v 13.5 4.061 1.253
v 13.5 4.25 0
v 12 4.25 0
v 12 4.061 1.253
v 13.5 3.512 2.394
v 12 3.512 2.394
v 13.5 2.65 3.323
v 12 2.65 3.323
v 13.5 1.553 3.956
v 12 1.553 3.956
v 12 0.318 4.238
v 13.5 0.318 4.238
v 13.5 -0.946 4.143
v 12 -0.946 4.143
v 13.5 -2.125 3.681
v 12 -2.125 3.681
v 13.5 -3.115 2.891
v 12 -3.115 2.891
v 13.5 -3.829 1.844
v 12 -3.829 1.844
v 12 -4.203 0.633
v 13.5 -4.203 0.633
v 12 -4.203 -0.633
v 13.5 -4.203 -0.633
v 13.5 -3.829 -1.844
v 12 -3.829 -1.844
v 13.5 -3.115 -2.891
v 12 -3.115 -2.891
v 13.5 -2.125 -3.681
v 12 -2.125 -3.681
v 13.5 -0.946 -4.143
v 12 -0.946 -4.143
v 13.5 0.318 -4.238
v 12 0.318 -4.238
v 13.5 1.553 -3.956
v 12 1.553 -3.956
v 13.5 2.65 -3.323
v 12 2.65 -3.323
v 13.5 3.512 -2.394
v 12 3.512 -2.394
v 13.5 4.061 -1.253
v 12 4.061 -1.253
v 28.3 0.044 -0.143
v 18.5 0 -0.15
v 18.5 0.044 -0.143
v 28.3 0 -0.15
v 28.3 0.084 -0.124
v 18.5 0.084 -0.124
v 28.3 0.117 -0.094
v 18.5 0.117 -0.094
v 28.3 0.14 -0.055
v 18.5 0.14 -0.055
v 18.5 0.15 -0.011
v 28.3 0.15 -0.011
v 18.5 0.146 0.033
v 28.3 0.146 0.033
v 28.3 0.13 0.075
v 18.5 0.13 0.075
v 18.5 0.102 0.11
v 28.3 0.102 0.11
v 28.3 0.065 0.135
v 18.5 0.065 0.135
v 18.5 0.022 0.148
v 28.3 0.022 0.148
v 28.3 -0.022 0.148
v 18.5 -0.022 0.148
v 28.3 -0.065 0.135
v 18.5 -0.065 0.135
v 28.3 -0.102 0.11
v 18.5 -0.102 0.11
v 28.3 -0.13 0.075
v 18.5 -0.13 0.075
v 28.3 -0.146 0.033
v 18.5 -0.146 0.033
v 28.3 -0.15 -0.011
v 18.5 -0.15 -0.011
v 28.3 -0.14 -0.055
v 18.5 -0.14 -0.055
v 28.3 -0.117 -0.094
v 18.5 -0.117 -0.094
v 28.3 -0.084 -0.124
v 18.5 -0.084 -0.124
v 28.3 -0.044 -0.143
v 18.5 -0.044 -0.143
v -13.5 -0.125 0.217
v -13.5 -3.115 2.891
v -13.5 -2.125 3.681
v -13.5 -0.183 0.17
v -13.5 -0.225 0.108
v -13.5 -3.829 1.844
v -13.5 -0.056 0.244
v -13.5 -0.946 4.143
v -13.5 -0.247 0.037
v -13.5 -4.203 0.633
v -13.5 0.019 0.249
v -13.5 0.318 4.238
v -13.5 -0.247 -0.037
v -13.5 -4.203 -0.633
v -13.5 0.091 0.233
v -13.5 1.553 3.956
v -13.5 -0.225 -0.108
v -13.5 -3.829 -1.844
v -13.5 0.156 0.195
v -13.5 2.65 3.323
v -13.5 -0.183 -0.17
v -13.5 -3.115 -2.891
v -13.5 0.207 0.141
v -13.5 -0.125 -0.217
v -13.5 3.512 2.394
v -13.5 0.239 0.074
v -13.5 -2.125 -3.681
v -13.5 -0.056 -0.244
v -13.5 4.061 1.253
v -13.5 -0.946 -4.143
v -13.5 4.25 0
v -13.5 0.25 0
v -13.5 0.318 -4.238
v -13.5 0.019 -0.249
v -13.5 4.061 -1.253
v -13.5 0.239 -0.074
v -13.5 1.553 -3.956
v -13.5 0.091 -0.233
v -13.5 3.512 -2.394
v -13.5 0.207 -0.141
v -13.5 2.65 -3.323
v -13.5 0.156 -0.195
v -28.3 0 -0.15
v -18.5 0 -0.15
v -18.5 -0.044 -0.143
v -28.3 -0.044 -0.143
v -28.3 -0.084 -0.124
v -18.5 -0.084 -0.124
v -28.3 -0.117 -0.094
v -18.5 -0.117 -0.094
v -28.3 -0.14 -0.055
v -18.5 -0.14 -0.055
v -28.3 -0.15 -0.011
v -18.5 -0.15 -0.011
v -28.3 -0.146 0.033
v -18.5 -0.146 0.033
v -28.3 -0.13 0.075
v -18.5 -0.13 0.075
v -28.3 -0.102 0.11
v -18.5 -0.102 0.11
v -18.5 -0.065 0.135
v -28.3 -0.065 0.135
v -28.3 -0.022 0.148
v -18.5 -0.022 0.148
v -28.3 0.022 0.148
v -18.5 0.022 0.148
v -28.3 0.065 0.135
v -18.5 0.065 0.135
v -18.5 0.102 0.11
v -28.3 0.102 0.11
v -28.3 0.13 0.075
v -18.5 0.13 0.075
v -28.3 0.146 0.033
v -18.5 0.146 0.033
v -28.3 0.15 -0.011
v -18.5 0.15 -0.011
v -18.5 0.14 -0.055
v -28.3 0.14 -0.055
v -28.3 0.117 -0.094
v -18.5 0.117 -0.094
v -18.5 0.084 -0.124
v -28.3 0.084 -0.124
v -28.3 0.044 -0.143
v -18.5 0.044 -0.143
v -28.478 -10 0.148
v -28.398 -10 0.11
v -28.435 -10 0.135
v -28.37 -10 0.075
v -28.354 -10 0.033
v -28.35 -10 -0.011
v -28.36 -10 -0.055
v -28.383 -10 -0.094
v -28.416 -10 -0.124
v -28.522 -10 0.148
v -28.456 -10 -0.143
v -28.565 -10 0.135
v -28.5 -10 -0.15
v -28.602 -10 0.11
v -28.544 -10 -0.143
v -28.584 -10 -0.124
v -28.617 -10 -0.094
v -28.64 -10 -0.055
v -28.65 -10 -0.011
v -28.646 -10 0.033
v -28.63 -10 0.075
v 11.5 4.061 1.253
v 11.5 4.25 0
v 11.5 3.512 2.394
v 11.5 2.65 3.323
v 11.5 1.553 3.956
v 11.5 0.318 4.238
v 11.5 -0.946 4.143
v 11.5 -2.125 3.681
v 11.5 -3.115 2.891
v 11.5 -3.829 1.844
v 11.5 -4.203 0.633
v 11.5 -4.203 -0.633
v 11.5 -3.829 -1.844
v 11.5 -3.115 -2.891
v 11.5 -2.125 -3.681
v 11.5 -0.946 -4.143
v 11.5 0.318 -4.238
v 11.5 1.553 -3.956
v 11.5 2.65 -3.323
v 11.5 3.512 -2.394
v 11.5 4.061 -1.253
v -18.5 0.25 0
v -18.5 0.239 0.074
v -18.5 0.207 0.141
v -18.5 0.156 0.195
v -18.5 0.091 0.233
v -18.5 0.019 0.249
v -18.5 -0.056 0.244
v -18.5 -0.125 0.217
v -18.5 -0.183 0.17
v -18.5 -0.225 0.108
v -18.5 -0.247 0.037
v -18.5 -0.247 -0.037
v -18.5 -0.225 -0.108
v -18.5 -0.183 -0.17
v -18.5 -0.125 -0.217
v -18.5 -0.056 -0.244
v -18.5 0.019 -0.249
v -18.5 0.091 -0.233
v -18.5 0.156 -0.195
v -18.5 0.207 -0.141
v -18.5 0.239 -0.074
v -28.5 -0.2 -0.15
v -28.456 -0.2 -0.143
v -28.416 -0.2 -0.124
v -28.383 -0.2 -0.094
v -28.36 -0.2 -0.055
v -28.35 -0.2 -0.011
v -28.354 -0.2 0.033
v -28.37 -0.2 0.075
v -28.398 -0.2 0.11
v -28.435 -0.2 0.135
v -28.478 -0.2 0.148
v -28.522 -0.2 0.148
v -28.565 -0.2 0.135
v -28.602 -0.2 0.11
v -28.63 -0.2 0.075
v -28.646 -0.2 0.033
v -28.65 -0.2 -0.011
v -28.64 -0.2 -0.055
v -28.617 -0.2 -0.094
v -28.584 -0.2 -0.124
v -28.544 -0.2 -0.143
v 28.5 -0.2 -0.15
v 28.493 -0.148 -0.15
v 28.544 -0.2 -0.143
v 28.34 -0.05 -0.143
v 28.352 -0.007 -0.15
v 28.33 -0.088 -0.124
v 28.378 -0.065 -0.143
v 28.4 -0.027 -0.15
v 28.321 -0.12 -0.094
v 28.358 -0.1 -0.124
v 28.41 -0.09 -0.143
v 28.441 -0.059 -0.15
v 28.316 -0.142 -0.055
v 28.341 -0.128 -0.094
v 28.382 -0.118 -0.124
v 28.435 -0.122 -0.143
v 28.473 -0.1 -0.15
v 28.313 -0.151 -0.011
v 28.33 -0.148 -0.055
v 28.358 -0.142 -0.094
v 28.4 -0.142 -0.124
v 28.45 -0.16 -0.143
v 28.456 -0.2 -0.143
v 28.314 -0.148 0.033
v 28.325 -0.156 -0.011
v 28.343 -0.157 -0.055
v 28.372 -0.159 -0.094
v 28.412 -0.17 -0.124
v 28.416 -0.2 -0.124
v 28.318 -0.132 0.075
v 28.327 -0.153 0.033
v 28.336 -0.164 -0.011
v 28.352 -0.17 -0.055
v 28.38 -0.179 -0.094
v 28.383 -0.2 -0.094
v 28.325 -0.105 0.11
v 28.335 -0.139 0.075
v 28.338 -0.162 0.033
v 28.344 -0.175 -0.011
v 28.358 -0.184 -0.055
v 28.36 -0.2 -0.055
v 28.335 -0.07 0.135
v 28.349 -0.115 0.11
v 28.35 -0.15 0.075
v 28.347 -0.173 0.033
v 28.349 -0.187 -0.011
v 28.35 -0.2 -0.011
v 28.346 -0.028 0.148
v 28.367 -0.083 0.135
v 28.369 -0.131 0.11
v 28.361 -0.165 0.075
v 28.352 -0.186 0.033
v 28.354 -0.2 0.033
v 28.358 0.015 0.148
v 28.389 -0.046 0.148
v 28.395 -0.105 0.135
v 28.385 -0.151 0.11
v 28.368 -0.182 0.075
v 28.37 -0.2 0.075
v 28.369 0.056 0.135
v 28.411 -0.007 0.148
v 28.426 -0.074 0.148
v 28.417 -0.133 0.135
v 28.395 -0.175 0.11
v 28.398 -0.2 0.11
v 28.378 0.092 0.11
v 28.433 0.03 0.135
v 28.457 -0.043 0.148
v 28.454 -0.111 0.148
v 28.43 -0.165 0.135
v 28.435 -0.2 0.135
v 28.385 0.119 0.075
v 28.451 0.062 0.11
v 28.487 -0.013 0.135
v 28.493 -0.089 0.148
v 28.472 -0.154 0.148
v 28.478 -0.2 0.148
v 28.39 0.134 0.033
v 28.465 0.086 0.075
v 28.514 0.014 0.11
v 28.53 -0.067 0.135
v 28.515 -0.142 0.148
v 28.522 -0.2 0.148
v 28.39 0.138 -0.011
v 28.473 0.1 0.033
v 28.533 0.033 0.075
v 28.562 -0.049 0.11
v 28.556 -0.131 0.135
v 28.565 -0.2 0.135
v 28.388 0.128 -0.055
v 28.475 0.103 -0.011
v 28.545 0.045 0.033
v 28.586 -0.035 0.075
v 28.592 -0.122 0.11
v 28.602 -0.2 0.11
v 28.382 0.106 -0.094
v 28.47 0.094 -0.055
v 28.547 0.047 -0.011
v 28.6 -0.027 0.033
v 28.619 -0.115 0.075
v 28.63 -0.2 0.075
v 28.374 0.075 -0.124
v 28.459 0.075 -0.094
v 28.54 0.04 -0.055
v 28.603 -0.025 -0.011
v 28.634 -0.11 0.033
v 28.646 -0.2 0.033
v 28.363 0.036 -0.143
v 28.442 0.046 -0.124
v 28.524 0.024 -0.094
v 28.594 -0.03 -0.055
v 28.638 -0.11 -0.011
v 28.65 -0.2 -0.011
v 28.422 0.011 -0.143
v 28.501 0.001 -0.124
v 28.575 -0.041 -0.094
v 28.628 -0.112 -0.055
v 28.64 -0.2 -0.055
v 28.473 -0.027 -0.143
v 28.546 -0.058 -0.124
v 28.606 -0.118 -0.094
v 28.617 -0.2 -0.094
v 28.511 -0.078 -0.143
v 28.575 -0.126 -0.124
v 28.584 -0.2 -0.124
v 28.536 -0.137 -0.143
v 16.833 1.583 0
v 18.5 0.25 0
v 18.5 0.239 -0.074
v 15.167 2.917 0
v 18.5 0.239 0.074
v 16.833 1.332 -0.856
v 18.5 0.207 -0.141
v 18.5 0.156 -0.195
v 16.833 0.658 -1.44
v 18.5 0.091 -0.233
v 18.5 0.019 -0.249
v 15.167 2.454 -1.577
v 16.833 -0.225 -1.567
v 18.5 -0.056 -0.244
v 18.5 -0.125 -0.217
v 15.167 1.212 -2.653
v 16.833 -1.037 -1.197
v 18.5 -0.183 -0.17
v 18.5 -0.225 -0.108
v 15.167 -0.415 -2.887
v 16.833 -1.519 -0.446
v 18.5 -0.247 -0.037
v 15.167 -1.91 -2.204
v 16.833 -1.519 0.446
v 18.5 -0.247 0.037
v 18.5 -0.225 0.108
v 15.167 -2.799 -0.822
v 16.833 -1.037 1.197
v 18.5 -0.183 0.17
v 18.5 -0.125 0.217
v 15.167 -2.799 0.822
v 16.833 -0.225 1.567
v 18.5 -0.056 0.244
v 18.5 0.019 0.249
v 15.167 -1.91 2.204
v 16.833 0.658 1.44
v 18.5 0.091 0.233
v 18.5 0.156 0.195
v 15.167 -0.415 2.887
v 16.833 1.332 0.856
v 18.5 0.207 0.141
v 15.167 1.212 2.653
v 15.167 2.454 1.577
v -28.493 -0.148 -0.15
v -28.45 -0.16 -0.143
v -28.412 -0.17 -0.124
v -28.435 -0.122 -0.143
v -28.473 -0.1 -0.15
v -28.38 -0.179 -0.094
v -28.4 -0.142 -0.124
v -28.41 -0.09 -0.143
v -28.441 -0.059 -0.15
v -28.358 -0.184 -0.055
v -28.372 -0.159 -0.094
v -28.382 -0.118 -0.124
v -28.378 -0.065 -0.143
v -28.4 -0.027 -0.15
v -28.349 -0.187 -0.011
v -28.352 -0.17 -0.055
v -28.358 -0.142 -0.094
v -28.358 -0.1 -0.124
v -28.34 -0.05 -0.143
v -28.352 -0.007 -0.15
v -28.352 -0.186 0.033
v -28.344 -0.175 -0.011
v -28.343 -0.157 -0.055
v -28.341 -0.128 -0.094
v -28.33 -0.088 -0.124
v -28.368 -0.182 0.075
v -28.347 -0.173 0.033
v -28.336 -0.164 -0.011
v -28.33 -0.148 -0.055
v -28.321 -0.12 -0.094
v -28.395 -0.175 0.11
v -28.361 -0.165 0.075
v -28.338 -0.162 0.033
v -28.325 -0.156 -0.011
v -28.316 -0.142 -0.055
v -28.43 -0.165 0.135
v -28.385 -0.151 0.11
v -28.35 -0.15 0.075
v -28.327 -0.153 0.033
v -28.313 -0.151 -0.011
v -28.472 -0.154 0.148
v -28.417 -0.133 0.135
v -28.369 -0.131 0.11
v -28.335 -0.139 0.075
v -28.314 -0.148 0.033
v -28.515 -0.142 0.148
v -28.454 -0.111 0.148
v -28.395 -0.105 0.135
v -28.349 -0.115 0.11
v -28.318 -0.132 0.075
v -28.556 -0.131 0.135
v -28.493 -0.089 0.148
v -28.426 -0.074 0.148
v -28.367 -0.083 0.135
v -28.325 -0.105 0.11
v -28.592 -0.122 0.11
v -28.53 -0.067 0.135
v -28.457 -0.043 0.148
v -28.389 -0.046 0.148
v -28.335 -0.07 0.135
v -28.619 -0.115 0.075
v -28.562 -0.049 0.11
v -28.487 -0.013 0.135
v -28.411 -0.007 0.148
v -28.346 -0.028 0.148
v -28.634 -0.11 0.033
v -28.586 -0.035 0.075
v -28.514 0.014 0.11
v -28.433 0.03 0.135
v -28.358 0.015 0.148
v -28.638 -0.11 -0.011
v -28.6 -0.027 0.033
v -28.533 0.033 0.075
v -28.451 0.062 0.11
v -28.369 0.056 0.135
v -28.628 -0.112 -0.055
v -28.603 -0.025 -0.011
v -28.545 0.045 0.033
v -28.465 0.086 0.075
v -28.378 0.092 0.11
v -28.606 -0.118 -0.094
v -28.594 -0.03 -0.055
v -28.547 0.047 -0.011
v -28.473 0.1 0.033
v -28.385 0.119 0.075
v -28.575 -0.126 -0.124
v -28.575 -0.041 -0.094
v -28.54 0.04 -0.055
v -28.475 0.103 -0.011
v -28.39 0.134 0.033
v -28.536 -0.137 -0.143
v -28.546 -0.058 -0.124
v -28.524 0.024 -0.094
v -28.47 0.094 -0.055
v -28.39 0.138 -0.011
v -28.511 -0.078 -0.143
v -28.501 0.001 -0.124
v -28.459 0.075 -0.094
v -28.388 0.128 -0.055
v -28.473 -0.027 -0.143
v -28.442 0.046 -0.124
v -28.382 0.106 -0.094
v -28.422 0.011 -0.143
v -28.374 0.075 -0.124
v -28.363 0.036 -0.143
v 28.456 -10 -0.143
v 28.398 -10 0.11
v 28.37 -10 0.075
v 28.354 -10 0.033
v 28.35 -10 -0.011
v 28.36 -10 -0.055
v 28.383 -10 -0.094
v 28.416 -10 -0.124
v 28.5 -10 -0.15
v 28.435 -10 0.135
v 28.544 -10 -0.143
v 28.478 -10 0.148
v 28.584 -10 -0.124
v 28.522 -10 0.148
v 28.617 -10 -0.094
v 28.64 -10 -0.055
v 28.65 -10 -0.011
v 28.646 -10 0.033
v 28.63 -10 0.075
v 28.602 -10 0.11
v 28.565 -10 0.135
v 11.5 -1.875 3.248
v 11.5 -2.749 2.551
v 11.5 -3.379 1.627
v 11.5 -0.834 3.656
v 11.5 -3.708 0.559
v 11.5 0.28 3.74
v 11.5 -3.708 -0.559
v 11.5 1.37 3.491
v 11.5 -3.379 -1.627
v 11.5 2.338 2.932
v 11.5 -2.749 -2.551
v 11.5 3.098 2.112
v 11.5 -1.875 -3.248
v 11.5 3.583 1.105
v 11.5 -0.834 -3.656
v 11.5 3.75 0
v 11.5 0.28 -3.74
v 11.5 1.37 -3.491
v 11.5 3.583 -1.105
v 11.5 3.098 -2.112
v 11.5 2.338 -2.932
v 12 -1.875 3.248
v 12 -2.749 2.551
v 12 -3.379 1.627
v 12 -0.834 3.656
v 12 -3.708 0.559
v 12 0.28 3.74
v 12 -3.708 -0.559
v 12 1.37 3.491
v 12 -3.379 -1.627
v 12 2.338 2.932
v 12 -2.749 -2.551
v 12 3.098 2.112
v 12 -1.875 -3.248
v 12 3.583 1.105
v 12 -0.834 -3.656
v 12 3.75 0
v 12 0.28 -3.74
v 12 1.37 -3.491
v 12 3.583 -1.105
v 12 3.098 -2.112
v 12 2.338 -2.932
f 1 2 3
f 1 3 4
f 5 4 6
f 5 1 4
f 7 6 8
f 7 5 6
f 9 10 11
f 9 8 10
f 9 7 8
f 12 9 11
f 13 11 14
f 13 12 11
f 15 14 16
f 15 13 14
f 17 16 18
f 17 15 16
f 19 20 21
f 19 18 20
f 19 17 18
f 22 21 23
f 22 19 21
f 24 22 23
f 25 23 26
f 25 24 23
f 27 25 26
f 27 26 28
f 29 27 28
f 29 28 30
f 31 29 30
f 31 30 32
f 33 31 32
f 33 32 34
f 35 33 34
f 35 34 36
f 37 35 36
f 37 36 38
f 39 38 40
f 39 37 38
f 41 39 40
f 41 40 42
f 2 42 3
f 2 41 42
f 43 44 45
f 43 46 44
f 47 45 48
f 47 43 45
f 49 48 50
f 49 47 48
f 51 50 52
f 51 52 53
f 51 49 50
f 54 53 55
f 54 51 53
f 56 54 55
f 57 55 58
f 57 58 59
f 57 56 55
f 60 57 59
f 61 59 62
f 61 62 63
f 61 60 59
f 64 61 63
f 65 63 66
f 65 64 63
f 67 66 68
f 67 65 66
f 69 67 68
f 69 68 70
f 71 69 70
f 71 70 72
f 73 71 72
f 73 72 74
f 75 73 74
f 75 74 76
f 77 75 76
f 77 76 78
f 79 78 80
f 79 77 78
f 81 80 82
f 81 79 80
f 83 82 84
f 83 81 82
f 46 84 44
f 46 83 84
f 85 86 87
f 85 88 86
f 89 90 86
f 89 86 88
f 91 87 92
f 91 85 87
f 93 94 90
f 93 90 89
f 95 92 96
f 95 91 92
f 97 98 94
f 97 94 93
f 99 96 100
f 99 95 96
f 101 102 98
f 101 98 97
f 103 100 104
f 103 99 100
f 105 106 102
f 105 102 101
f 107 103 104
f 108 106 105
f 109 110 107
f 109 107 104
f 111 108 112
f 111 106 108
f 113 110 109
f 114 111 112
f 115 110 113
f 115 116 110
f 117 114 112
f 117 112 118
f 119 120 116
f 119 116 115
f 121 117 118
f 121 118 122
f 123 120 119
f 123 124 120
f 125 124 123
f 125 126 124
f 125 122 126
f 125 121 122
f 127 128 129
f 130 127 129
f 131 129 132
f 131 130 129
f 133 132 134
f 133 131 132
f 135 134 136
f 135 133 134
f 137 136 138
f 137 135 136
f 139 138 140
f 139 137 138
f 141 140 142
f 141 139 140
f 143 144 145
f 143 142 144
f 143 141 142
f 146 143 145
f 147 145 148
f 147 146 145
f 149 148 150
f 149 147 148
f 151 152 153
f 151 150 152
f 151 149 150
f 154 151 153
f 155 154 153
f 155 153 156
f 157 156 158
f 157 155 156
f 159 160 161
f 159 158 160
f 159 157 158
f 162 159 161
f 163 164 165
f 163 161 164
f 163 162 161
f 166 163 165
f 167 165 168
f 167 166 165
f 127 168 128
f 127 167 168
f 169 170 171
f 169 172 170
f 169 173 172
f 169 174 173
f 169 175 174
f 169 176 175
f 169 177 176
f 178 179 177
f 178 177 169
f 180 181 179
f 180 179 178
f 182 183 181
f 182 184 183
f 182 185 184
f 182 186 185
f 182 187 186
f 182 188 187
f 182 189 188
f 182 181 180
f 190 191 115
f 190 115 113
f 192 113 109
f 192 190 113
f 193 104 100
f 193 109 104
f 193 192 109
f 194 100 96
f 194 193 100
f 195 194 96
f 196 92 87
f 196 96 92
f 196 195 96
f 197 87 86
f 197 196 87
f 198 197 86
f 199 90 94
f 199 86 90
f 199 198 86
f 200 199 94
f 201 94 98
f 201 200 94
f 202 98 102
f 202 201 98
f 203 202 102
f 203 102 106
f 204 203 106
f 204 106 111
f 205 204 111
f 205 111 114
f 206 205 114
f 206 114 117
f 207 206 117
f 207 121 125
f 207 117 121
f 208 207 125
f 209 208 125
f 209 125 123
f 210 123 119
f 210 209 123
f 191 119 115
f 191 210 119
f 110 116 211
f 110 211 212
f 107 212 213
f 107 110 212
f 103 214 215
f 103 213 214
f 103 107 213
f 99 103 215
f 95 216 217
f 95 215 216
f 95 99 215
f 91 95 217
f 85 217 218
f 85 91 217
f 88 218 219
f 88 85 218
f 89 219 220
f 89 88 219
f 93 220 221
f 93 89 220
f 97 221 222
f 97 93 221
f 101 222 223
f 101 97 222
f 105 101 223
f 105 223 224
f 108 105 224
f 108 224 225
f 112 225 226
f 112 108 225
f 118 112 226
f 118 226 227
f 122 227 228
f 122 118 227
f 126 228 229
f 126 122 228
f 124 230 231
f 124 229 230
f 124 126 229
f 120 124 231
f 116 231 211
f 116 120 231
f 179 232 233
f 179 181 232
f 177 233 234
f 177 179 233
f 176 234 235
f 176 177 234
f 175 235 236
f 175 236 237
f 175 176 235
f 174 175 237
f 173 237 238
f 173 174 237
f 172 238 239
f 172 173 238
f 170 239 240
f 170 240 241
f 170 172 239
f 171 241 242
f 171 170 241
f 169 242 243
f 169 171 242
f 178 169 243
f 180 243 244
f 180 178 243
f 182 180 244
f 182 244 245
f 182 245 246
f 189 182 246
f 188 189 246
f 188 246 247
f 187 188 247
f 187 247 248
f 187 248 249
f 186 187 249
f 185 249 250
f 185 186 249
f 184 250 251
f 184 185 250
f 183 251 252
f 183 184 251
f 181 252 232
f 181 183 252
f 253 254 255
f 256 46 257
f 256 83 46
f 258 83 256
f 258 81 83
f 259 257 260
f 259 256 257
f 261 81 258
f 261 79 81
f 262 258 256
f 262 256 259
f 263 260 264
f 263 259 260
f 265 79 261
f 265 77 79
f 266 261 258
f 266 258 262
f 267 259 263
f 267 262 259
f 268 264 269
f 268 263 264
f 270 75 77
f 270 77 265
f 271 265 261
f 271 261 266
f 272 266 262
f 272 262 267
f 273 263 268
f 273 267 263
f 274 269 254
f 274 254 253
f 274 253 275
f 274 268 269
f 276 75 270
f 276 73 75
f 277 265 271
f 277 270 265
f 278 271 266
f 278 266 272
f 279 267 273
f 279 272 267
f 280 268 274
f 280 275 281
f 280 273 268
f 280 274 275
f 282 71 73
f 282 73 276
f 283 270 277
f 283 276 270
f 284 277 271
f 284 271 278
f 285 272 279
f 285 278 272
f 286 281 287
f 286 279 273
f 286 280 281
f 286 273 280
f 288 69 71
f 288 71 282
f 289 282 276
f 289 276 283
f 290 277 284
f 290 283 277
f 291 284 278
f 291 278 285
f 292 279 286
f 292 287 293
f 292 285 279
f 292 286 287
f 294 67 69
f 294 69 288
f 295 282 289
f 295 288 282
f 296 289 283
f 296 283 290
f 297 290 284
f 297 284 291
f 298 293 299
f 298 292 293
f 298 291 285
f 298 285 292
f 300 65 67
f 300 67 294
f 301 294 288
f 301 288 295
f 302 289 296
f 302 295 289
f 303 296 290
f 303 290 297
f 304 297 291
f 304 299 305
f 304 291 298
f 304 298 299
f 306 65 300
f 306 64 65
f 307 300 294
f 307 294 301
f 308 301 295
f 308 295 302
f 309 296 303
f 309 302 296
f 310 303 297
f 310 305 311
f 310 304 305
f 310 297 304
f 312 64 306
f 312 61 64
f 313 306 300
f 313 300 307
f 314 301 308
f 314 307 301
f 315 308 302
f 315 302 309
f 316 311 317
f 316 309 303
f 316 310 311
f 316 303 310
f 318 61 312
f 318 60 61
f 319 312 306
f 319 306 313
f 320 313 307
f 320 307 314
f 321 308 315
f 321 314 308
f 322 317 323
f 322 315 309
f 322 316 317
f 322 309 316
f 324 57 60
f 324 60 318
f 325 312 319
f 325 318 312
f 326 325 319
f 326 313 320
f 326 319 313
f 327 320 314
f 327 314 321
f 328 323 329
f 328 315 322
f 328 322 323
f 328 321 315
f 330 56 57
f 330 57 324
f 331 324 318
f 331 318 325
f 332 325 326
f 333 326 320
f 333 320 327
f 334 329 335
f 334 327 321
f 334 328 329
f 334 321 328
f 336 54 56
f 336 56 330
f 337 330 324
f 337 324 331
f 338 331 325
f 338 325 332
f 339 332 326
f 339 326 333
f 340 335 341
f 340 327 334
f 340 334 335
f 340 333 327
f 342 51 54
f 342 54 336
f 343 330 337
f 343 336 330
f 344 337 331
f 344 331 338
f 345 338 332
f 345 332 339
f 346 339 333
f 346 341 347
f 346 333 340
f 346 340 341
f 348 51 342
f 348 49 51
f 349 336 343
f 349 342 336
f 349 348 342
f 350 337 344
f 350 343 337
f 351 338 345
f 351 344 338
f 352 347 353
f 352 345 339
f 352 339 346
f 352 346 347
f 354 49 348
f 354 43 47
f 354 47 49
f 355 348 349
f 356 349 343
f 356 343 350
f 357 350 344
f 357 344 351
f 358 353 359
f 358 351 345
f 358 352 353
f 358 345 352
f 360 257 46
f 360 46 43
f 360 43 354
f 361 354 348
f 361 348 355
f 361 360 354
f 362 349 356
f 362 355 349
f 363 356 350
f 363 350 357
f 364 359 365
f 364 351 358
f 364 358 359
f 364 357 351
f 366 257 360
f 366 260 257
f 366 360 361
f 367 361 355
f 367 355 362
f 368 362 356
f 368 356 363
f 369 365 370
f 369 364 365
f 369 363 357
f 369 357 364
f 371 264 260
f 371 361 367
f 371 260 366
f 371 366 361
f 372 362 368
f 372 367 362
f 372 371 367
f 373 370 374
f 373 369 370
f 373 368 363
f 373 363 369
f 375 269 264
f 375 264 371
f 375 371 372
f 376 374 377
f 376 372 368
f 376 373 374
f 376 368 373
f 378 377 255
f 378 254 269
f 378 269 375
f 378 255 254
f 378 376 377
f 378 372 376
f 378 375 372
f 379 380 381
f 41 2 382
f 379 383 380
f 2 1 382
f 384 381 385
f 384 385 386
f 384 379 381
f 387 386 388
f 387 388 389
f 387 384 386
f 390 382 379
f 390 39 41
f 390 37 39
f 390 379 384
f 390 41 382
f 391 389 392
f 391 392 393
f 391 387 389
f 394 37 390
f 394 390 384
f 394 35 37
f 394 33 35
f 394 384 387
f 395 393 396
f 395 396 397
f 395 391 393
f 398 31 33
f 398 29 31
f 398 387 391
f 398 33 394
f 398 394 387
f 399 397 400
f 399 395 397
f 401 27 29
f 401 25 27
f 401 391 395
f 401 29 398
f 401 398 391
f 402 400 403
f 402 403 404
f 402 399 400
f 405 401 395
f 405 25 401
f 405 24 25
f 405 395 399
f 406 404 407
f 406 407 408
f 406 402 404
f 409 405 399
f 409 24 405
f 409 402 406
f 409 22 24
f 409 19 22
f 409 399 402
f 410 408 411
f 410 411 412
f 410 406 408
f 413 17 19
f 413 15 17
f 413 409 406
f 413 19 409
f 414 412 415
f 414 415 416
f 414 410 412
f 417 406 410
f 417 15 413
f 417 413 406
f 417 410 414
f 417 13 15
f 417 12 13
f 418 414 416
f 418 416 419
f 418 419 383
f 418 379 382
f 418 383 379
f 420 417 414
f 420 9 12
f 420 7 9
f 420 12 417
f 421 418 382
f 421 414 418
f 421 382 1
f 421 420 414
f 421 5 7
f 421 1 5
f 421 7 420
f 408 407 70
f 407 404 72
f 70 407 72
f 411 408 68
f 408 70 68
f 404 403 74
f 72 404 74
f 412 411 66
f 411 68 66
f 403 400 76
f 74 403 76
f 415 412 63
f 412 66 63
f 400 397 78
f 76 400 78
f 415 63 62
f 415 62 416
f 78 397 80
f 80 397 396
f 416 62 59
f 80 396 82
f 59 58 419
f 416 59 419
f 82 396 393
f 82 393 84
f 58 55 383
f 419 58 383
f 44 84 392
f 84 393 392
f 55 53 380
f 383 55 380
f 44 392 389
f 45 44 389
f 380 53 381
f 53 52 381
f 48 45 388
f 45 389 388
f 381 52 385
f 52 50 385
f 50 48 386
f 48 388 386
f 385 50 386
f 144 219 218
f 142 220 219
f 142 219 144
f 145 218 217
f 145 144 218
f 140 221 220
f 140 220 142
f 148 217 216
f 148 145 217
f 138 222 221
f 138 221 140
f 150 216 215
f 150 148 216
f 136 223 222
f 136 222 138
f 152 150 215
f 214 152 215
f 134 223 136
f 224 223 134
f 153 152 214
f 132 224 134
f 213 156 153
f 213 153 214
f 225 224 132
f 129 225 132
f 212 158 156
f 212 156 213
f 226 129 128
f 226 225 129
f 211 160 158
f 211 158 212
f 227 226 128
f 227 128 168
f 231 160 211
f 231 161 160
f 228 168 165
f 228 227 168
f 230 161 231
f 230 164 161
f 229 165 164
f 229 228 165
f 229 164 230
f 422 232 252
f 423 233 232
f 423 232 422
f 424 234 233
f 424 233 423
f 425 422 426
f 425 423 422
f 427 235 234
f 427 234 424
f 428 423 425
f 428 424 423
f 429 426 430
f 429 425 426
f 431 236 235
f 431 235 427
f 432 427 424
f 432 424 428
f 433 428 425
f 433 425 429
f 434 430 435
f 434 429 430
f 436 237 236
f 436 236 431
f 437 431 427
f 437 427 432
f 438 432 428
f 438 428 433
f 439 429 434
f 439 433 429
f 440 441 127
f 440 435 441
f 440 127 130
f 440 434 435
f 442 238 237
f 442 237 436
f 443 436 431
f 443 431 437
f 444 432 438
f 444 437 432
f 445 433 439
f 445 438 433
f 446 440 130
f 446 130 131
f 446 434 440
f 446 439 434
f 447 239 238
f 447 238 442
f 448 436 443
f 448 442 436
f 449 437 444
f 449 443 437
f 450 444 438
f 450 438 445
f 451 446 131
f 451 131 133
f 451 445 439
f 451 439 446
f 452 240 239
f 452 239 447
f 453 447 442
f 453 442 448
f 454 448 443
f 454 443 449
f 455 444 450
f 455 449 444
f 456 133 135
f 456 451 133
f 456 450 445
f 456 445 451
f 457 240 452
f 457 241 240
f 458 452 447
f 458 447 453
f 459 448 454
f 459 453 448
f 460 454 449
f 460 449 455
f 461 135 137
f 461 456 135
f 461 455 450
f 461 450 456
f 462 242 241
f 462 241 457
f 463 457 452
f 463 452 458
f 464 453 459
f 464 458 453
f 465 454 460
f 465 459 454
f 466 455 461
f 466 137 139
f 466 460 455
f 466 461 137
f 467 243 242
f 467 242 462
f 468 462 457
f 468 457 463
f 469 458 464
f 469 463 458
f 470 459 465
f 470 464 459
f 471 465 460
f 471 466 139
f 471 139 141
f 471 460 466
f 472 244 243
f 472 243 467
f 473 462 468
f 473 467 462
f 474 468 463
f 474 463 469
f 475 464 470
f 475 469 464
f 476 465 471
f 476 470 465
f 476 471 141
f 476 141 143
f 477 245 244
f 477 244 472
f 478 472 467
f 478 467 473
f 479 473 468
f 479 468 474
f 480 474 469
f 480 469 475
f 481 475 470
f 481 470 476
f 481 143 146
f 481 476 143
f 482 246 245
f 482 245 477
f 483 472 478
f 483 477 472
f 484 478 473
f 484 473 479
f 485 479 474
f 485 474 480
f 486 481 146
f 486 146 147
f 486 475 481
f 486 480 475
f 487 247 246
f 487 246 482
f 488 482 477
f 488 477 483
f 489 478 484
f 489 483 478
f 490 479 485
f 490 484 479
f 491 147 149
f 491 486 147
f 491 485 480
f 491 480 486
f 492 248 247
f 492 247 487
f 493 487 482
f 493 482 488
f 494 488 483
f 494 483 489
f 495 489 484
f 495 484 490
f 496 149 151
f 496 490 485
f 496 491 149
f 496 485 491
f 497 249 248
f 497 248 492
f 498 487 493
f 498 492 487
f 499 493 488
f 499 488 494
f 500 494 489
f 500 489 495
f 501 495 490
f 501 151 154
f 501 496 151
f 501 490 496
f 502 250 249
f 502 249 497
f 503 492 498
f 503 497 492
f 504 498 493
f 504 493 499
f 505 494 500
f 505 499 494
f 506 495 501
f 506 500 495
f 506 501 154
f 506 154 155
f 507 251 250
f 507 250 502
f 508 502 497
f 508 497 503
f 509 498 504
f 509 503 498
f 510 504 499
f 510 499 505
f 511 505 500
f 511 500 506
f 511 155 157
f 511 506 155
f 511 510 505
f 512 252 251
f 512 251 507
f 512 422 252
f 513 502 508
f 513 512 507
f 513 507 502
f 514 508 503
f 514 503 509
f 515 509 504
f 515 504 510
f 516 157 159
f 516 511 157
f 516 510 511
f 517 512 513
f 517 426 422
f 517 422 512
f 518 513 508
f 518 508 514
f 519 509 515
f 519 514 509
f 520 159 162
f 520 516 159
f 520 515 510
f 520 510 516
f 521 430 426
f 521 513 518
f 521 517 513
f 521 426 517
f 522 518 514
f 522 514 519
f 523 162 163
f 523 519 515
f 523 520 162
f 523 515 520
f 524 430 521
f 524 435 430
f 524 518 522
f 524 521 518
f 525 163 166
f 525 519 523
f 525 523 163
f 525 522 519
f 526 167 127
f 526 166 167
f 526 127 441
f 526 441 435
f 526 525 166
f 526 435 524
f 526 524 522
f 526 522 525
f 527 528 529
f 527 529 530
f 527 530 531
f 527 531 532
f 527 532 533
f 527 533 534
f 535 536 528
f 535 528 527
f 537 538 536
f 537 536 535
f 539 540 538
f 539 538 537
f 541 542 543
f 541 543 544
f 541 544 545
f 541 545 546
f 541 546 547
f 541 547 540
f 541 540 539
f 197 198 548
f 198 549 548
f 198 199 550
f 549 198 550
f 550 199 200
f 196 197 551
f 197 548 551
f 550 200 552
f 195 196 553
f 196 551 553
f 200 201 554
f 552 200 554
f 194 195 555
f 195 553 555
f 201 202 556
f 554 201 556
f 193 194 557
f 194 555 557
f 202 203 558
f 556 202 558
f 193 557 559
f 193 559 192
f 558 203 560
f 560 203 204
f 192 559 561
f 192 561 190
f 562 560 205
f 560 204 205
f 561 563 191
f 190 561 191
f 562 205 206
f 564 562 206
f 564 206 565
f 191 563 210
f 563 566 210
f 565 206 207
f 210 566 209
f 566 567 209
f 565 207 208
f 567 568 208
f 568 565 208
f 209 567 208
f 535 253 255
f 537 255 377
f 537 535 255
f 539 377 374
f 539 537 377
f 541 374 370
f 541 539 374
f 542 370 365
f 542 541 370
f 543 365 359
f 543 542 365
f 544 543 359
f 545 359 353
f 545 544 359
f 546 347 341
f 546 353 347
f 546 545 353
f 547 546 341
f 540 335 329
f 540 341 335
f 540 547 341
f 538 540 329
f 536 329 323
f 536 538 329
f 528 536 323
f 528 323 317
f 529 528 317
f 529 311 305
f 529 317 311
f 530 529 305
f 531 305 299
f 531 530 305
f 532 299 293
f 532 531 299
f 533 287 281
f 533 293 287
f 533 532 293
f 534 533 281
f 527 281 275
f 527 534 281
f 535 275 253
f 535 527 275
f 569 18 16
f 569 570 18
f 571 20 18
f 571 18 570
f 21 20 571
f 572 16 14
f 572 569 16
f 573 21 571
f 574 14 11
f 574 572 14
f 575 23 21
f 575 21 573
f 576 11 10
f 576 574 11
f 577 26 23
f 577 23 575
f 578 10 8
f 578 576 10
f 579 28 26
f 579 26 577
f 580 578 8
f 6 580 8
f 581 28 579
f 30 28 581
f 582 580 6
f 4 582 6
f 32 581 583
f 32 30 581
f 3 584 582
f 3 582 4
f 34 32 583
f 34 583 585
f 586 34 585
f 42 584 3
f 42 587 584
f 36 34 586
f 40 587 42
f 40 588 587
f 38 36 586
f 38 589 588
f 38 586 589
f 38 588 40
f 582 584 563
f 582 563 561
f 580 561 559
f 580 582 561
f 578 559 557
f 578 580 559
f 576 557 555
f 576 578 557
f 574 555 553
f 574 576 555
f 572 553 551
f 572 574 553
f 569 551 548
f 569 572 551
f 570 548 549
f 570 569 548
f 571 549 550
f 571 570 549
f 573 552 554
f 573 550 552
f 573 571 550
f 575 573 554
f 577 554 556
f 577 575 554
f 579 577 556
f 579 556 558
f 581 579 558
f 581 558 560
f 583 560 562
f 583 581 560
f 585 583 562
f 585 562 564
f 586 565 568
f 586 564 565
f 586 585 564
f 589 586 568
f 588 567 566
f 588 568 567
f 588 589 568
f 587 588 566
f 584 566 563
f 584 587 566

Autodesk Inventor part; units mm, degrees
ref_plane "YZ Plane" through (0, 0, 0) normal (1, 0, 0) x (0, 1, 0)
ref_plane "XZ Plane" through (0, 0, 0) normal (0, 1, 0) x (-1, 0, 0)
ref_plane "XY Plane" through (0, 0, 0) normal (0, 0, 1) x (1, 0, 0)
sketch "Sketch1" plane through (0, 0, 0) normal (0, 0, 1) x (1, 0, 0)
  line L0 (-18.5, 0) -> (-18.5, 0.25)
  line L1 (-18.5, 0.25) -> (-13.5, 0.25)
  line L2 (-13.5, 0.25) -> (-13.5, 4.25)
  line L3 (-13.5, 4.25) -> (11.5, 4.25)
  line L4 (11.5, 4.25) -> (11.5, 3.75)
  line L5 (11.5, 3.75) -> (12, 3.75)
  line L6 (12, 3.75) -> (12, 4.25)
  line L7 (12, 4.25) -> (13.5, 4.25)
  line L8 (18.5, 0) -> (18.5, 0.25)
  line L9 (18.5, 0.25) -> (13.5, 4.25)
  line L10 (18.5, 0) -> (-18.5, 0)
  point P0 (0, 0)
  dimension "d0" = 0.25
  dimension "d1" = 5
  dimension "d2" = 4
  dimension "d8" = 25
  dimension "d9" = 0.5
  dimension "d10" = 0.5
  dimension "d11" = 0.5
  dimension "d12" = 1.5
  dimension "d14" = 0.25
revolve "Revolution1" add sketch "Sketch1" angle 360 about axis through (18.5, 0, 0) along (-1, 0, 0)
sketch "Sketch2" plane through (0, 0, 0) normal (0, 0, 1) x (1, 0, 0)
  line L0 (18.5, 0.25) -> (18.5, -0.25) projected
  line L1 (18.5, 0) -> (28.3, 0)
  line L2 (28.5, -0.2) -> (28.5, -10)
  arc A0 (28.5, -0.2) -> (28.3, 0) centre (28.3, -0.2) ccw
  point P0 (0, 0)
  point P1 (28.5, 0)
  dimension "d16" = 10
  dimension "d17" = 10
  dimension "d18" = 0.2
ref_plane "Work Plane1" through (18.5, 0, 0) normal (1, 0, 0) x (0, 0, -1)
sketch "Sketch3" plane through (18.5, 0, 0) normal (1, 0, 0) x (0, 0, -1)
  circle A0 centre (0, 0) radius 0.15
  dimension "d20" = 0.3
sweep "Sweep1" add profiles "Sketch3" path "Sketch2" path curves L1 A0 L2
mirror "Mirror1" about plane through (0, 0, 0) normal (1, 0, 0) of "Sweep1"
equation "\"BendRadius\" = Thickness"
equation "\"BendReliefWidth\" = Thickness"
equation "\"BendReliefDepth\" = 0.5 * Thickness"
equation "\"CornerReliefSize\" = 4 * Thickness"
equation "\"MinimumRemnant\" = 2 * Thickness"
equation "\"TransitionRadius\" = BendRadius"
equation "\"JacobiRadiusSize\" = BendRadius"
equation "\"GapSize\" = Thickness"
equation "\"Thickness\" = 3.048"
properties part number "K50-29"
